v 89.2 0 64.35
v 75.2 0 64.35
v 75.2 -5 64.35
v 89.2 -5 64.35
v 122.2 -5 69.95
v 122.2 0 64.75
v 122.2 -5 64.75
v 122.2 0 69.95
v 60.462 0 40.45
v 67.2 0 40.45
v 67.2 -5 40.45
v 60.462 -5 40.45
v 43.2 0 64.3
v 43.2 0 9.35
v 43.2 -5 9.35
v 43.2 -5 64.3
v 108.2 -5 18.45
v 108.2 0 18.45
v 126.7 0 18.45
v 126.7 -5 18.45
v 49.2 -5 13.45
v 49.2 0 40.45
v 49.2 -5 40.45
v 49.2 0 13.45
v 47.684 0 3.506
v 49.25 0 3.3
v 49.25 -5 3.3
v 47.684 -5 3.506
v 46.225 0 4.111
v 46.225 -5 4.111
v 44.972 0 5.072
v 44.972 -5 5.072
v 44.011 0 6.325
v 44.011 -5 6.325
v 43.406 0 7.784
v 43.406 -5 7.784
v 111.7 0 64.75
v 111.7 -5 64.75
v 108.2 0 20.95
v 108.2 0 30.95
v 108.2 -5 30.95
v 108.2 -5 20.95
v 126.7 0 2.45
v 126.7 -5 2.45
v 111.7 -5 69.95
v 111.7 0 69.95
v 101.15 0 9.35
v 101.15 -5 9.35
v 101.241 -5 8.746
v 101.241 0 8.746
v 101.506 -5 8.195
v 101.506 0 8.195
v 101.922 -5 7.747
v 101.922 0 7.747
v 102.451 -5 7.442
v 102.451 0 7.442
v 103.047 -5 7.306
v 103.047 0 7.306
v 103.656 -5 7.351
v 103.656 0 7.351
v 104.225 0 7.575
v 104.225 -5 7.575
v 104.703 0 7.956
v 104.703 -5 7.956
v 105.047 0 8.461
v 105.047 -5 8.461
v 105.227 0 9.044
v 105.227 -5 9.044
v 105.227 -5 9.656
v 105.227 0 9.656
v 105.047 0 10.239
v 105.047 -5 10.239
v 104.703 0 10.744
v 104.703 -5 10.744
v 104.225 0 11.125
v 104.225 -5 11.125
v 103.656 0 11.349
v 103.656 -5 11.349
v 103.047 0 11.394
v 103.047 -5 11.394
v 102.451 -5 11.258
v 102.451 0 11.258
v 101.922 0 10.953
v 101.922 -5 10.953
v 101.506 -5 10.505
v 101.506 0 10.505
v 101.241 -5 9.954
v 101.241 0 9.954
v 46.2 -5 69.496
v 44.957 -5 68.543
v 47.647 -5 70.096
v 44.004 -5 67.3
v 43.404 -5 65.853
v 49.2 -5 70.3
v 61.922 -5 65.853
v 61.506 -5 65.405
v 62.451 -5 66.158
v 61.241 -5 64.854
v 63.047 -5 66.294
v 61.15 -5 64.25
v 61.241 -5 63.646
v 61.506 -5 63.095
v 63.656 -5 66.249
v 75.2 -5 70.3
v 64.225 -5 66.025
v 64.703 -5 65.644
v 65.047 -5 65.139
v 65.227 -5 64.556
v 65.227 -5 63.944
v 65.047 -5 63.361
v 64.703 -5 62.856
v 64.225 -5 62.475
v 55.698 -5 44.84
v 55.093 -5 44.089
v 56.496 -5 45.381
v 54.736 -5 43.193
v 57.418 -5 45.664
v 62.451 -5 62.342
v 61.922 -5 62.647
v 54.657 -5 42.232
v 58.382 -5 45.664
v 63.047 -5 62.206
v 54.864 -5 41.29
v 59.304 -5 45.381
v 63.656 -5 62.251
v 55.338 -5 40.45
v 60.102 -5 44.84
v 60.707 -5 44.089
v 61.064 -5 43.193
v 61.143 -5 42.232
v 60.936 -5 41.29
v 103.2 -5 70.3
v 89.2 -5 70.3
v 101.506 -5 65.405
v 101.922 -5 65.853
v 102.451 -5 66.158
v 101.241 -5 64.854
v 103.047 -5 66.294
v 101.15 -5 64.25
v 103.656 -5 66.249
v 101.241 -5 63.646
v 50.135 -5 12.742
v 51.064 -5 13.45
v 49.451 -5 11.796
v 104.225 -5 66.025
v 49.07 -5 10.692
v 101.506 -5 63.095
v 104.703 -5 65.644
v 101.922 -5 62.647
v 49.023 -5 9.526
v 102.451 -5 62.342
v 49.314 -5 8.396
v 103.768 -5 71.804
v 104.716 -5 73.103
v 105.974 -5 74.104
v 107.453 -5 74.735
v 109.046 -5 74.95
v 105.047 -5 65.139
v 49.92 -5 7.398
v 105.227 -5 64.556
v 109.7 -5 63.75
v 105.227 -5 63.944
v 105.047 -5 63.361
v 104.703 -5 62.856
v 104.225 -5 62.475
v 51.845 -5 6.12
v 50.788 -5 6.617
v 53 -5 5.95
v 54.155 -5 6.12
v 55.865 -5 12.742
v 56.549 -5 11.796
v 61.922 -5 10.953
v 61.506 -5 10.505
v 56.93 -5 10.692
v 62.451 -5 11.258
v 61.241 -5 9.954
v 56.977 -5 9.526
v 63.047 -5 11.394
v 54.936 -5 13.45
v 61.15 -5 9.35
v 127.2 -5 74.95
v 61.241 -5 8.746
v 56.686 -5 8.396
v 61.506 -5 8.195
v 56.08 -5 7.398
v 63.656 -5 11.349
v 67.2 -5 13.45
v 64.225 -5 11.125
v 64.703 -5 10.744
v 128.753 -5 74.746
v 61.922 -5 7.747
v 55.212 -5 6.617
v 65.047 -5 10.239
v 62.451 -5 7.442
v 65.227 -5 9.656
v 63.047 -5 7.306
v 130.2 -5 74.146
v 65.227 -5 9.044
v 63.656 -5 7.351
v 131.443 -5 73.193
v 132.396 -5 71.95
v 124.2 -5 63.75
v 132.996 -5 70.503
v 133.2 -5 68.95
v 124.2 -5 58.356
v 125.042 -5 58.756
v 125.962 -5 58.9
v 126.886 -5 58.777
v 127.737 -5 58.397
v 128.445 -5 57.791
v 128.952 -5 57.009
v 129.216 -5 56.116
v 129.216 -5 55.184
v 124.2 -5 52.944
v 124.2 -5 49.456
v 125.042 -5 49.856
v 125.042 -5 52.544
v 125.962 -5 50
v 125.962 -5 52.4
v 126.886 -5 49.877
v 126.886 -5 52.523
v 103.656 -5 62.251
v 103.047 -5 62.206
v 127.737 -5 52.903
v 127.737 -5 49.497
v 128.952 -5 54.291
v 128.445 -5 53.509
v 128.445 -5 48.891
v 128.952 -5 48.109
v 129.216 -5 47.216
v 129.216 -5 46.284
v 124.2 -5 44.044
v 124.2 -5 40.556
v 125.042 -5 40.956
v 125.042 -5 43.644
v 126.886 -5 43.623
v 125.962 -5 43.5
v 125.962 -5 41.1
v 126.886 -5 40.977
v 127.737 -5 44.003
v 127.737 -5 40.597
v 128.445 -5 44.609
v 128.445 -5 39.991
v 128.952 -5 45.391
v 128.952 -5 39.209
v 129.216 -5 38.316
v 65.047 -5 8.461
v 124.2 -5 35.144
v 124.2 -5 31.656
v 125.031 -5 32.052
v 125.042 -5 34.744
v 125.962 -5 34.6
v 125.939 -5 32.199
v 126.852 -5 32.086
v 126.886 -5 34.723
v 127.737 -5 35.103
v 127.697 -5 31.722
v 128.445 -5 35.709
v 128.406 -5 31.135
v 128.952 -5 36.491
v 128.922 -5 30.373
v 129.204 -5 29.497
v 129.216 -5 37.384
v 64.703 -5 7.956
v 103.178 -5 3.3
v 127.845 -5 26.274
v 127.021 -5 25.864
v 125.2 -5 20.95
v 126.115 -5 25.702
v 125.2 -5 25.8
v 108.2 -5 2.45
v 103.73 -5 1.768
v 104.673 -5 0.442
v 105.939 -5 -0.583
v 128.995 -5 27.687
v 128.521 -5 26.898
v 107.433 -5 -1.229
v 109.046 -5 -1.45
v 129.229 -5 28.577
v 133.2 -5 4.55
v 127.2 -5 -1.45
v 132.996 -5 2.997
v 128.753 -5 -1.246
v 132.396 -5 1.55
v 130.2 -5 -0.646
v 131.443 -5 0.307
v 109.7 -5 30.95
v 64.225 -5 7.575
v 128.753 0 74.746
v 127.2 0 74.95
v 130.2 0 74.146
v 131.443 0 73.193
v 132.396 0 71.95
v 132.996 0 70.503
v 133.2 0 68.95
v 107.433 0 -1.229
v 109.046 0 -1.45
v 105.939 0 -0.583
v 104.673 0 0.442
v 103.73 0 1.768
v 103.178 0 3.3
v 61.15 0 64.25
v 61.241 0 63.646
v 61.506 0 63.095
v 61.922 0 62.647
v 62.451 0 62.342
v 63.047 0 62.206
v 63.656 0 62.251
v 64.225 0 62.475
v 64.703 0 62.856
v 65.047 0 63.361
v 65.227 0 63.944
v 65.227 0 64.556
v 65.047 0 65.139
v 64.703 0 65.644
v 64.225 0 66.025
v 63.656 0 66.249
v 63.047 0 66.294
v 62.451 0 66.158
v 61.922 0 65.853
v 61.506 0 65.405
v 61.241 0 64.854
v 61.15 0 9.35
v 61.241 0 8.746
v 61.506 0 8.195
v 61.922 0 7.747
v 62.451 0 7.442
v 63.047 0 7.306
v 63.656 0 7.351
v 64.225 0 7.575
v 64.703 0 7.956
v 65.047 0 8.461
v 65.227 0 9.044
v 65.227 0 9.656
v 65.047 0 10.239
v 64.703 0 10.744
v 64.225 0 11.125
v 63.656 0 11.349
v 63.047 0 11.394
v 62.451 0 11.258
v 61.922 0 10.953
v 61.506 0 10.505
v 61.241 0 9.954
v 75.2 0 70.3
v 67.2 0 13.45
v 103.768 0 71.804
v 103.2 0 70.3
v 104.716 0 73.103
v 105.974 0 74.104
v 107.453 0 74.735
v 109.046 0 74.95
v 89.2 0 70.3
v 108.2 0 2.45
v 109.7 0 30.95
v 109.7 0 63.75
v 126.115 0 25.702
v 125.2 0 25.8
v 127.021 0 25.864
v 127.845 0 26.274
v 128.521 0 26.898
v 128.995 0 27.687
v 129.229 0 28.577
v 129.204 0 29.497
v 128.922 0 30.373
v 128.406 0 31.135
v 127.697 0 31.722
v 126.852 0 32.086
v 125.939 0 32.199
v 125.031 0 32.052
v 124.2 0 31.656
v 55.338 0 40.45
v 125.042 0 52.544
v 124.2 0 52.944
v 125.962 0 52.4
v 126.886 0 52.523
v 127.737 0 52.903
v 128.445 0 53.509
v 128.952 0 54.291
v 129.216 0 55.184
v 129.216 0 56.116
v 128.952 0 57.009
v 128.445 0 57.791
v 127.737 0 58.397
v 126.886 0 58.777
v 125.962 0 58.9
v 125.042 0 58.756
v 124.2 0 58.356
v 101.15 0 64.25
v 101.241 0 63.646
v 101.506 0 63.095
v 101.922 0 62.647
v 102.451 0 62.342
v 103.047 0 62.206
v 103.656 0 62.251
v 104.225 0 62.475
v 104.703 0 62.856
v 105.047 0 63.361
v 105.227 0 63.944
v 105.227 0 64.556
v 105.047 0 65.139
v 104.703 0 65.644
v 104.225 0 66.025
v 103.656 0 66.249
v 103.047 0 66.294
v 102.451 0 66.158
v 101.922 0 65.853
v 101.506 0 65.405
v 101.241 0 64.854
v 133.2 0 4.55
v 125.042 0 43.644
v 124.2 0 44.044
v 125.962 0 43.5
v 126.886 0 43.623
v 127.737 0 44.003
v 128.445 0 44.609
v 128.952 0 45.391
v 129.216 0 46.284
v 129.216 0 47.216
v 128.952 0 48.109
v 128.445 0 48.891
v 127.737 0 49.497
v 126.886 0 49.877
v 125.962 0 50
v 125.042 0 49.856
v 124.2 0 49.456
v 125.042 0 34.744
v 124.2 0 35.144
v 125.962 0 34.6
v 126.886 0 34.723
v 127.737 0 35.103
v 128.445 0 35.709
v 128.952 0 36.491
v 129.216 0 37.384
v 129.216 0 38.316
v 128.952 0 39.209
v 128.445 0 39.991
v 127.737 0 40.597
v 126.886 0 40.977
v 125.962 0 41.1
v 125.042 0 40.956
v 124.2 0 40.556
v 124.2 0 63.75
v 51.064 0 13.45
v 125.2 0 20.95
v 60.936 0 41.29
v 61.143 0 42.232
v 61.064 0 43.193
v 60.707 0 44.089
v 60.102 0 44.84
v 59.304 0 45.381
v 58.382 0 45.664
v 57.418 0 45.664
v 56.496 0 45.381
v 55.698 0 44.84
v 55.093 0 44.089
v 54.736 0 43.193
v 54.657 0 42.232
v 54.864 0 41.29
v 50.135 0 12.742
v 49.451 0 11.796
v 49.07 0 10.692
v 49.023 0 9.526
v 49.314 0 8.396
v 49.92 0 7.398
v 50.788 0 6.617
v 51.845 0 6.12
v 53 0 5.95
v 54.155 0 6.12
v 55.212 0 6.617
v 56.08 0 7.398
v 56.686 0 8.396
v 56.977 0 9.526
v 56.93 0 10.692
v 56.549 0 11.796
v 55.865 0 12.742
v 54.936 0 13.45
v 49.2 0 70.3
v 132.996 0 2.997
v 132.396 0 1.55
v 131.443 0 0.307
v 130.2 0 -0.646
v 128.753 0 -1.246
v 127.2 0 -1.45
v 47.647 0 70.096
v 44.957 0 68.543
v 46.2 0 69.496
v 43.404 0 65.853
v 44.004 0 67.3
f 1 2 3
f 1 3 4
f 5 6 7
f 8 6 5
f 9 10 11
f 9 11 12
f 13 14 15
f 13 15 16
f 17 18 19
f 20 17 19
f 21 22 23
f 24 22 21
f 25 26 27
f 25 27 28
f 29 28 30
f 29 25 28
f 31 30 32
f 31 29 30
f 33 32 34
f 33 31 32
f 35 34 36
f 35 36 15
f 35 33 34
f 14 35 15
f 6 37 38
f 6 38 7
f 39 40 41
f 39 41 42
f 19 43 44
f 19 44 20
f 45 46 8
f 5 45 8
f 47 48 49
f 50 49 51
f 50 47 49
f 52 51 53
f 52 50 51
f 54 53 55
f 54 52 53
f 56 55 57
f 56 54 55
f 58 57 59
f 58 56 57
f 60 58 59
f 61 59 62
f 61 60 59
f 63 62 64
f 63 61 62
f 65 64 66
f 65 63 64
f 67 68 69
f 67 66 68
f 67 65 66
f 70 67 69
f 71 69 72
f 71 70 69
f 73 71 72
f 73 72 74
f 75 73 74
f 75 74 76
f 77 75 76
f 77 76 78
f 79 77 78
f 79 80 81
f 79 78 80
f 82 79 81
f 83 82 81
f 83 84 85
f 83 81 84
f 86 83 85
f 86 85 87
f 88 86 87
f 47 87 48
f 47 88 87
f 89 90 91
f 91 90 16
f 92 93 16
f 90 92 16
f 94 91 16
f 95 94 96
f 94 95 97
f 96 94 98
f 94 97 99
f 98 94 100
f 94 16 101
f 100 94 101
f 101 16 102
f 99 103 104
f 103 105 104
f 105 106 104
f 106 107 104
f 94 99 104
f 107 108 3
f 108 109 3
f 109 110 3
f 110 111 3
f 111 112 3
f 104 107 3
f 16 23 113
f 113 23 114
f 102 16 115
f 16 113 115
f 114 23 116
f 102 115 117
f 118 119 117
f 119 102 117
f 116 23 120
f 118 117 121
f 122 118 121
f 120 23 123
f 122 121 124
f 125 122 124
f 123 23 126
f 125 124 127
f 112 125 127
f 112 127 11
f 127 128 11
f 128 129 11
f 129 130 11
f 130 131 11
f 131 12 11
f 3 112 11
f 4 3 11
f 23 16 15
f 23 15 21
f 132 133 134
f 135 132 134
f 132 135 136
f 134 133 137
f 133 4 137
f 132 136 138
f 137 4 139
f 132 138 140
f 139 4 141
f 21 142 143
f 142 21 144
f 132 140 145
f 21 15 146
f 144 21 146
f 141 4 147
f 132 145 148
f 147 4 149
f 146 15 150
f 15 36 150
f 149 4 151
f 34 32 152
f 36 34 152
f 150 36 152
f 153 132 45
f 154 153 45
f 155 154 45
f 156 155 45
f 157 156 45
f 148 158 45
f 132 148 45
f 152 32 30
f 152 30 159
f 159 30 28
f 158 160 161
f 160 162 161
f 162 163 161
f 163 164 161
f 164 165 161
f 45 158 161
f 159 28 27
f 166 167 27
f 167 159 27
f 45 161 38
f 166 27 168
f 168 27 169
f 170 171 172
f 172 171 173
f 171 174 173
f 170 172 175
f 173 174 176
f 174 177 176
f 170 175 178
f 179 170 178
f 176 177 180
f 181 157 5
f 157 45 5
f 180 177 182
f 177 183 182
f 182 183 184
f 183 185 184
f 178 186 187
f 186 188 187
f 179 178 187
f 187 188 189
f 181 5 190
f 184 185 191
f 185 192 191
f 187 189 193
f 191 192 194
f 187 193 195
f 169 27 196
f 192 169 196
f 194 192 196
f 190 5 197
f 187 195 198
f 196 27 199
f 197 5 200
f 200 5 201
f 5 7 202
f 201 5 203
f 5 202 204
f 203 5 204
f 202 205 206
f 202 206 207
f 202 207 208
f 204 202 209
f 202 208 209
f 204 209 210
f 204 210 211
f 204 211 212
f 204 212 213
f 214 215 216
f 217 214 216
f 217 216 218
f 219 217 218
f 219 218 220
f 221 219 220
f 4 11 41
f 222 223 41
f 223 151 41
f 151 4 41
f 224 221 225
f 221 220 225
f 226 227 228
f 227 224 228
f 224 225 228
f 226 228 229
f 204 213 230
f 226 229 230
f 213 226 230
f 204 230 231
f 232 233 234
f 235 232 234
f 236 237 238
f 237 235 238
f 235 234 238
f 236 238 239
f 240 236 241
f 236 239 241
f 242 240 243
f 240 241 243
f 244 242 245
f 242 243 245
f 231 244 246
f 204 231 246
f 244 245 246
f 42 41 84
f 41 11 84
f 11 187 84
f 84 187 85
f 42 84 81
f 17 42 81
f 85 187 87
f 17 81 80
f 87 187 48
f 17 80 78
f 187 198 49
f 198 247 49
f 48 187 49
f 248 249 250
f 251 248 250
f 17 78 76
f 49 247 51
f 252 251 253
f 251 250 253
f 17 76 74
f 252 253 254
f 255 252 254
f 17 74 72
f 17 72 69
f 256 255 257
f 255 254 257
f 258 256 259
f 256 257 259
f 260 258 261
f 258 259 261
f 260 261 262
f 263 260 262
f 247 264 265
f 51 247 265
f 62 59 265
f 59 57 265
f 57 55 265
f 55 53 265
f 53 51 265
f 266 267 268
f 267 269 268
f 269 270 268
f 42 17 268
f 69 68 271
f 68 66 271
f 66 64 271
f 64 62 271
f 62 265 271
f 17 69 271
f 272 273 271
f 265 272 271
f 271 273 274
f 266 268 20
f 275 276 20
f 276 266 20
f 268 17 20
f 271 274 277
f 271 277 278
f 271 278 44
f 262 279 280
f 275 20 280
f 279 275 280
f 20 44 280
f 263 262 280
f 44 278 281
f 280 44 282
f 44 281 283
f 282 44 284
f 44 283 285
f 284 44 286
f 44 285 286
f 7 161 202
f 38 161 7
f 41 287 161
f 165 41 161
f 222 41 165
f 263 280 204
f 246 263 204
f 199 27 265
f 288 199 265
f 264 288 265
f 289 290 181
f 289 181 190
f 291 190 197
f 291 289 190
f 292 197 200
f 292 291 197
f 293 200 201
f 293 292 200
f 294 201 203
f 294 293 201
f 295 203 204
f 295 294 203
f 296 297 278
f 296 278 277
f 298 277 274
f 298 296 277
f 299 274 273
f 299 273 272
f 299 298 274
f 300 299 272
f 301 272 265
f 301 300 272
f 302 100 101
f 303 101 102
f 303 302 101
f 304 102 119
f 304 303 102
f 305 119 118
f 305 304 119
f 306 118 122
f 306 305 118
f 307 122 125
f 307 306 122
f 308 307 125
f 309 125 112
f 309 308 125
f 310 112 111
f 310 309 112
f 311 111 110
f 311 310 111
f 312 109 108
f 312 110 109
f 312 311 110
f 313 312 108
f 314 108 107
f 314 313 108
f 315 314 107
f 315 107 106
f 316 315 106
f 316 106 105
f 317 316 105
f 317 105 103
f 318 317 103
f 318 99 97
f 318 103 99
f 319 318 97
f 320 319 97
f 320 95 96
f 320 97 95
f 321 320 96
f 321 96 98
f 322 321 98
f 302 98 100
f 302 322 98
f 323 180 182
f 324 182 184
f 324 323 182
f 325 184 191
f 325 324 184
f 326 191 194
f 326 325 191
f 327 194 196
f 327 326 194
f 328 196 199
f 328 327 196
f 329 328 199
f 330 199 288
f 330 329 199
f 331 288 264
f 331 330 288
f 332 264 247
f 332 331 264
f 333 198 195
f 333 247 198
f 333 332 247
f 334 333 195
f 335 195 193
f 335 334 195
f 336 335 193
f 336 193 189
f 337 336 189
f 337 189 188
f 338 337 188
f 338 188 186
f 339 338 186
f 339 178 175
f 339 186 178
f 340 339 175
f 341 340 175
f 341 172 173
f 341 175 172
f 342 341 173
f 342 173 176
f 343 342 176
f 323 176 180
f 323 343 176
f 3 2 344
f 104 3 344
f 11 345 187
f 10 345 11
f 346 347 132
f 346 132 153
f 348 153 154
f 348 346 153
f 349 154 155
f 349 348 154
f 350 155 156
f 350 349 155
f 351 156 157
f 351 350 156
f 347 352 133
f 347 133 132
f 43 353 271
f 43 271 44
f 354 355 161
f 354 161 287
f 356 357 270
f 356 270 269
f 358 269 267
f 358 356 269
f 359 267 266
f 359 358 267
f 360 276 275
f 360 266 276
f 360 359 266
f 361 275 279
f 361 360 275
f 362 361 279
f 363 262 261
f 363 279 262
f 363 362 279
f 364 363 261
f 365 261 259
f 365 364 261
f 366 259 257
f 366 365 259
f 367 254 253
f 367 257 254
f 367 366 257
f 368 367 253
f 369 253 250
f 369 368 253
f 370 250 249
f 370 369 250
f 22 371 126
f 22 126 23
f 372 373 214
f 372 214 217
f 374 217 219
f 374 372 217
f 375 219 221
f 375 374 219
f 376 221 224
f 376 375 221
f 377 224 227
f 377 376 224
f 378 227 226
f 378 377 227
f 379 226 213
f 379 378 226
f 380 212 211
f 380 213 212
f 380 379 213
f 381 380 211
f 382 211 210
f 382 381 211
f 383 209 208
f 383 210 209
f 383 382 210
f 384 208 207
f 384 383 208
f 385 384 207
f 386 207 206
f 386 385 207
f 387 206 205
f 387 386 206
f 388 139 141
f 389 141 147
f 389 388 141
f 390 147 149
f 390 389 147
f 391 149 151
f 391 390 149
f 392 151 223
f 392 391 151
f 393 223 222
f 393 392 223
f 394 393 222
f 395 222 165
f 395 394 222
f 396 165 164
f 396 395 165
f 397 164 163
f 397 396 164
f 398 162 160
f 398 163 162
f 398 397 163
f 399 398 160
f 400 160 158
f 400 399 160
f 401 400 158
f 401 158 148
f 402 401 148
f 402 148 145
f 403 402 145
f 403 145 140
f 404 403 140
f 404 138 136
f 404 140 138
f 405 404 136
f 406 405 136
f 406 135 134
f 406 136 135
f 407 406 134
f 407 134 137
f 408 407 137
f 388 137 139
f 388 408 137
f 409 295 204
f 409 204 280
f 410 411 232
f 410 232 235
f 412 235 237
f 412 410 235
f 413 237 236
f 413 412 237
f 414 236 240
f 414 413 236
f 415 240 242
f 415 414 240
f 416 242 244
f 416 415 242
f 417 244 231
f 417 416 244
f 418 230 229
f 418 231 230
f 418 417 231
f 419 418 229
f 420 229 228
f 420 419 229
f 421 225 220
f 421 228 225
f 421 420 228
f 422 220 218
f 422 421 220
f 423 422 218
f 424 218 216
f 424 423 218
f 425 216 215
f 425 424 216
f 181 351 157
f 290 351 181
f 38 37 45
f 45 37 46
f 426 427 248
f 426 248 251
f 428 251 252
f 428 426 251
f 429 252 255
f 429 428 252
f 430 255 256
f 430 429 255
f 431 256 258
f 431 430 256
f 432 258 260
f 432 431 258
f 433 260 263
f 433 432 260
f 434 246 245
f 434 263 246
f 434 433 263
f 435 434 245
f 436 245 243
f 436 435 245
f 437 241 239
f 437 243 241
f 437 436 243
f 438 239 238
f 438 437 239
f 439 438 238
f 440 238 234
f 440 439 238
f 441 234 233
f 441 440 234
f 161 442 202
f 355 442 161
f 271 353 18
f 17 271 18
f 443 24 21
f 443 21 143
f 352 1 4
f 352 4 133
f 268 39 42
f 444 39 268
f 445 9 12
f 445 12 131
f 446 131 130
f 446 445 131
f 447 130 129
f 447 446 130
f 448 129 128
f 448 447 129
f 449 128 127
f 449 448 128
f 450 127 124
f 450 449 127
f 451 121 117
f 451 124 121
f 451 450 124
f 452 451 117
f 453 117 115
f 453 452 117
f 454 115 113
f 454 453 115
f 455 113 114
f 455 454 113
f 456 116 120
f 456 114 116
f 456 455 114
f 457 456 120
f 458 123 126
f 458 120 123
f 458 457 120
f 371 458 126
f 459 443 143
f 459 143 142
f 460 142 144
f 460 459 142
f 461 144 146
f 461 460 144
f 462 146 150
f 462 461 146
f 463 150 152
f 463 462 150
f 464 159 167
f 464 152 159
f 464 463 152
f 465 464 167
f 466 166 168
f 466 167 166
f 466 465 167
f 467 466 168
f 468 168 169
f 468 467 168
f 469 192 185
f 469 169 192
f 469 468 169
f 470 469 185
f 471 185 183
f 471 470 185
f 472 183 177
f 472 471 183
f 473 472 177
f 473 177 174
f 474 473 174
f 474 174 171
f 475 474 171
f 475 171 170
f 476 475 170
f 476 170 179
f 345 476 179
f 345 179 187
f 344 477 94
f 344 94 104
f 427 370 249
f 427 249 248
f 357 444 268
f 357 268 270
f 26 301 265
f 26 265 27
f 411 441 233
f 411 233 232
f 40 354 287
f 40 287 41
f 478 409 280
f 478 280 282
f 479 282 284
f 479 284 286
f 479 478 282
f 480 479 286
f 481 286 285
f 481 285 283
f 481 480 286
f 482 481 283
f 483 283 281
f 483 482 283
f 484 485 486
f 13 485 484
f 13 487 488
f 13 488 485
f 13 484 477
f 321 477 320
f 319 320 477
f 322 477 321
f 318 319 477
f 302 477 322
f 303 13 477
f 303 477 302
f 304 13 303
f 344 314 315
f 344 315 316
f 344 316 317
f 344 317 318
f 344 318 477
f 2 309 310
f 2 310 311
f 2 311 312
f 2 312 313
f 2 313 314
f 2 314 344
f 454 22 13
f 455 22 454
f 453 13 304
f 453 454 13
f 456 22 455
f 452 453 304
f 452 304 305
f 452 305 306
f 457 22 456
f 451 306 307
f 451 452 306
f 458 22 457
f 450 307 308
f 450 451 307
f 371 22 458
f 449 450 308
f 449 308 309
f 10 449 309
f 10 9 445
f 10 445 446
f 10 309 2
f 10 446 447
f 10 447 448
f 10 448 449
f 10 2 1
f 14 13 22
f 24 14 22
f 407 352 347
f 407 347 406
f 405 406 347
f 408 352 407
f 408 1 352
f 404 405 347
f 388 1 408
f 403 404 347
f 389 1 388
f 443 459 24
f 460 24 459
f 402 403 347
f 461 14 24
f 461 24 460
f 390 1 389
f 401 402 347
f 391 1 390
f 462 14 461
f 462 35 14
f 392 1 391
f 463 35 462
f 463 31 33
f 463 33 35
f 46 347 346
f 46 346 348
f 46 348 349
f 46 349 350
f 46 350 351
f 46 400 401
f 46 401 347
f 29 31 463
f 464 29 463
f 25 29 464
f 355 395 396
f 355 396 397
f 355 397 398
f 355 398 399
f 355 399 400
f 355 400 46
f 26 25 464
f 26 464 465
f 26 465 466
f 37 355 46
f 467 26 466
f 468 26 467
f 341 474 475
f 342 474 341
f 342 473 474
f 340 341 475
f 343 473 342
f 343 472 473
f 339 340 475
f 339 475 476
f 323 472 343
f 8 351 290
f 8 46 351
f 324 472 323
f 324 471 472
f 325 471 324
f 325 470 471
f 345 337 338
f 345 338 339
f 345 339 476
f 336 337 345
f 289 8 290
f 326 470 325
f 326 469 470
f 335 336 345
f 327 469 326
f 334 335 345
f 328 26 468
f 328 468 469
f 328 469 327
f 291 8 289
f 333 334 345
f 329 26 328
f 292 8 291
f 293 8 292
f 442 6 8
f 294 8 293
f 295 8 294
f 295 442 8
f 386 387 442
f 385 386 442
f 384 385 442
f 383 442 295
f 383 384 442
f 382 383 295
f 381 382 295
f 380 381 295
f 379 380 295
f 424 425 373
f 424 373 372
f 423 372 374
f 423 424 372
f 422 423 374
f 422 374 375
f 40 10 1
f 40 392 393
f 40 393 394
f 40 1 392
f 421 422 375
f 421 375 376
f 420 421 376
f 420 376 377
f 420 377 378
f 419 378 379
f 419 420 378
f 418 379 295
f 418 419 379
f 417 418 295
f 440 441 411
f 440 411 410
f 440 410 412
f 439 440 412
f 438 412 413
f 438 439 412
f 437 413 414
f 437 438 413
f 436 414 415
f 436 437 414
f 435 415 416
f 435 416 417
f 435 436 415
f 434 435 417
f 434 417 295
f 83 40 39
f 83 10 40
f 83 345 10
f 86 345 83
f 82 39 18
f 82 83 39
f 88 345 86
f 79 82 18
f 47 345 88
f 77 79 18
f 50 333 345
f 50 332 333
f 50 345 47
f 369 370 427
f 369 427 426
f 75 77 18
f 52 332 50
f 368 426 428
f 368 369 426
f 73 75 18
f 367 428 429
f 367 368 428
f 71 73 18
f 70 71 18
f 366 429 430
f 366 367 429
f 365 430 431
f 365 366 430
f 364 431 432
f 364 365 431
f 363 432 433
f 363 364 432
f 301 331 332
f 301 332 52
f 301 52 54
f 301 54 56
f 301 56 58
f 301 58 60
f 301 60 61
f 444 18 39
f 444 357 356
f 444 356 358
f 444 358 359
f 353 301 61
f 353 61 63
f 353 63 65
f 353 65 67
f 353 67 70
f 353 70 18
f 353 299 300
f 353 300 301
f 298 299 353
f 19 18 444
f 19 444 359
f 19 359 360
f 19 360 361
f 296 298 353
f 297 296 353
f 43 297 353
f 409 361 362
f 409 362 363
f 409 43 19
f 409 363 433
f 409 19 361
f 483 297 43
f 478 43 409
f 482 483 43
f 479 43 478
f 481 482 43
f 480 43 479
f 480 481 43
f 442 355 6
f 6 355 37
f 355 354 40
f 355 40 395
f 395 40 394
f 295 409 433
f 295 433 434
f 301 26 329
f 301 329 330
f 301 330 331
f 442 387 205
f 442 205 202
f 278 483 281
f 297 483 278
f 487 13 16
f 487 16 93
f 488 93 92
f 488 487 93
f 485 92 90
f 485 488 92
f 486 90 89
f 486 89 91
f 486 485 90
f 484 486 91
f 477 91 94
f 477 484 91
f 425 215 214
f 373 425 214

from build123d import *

# Parameters (mm, degrees)
SKETCH_2_R          = 6.05
SKETCH_2_R_2        = 2.05
EXTRUDE_1_DEPTH     = 5
EXTRUDE_1_2_DEPTH   = 5
EXTRUDE_1_3_DEPTH   = 5
EXTRUDE_1_4_DEPTH   = 5
SKETCH_6_R          = 2.05
EXTRUDE_1_5_DEPTH   = 5
SKETCH_8_W          = 18.5
SKETCH_8_H          = 16
SKETCH_8_W_2        = 10.5
SKETCH_8_H_2        = 5.2
SKETCH_8_W_3        = 14
SKETCH_8_H_3        = 9
CUT_EXTRUDE_2_DEPTH = 153.920706577


with BuildPart() as part:
    # 草图2 → Extrude 1 (new body)
    with BuildSketch(Plane(origin=(0, 0, 0), x_dir=(-1, 0, 0), z_dir=(0, -1, 0))):
        with Locations((-103.2, -9.35)):
            Circle(SKETCH_2_R)
        with Locations((-103.2, -9.35)):
            Circle(SKETCH_2_R_2, mode=Mode.SUBTRACT)
    extrude(amount=EXTRUDE_1_DEPTH)



with BuildPart() as body_2:
    # 草图2 → Extrude 1 2 (new body)
    with BuildSketch(Plane(origin=(0, 0, 0), x_dir=(-1, 0, 0), z_dir=(0, -1, 0))):
        with Locations((-63.2, -9.35)):
            Circle(SKETCH_2_R)
        with Locations((-63.2, -9.35)):
            Circle(SKETCH_2_R_2, mode=Mode.SUBTRACT)
    extrude(amount=EXTRUDE_1_2_DEPTH)


with BuildPart() as body_3:
    # 草图2 → Extrude 1 3 (new body)
    with BuildSketch(Plane(origin=(0, 0, 0), x_dir=(-1, 0, 0), z_dir=(0, -1, 0))):
        with Locations((-63.2, -64.25)):
            Circle(SKETCH_2_R)
        with Locations((-63.2, -64.25)):
            Circle(SKETCH_2_R_2, mode=Mode.SUBTRACT)
    extrude(amount=EXTRUDE_1_3_DEPTH)


with BuildPart() as body_4:
    # 草图2 → Extrude 1 4 (new body)
    with BuildSketch(Plane(origin=(0, 0, 0), x_dir=(-1, 0, 0), z_dir=(0, -1, 0))):
        with Locations((-103.2, -64.25)):
            Circle(SKETCH_2_R)
        with Locations((-103.2, -64.25)):
            Circle(SKETCH_2_R_2, mode=Mode.SUBTRACT)
    extrude(amount=EXTRUDE_1_4_DEPTH)


with BuildPart() as part_1:
    add(part.part)

    add(body_2.part)  # Extrude 1 5 merges body 2

    add(body_3.part)  # Extrude 1 5 merges body 3

    add(body_4.part)  # Extrude 1 5 merges body 4
    # 草图6 → Extrude 1 5 (add)
    with BuildSketch(Plane(origin=(0, 0, 0), x_dir=(1, 0, 0), z_dir=(0, 1, 0))):
        with BuildLine():
            Line((127.2, 1.45), (109.046152581, 1.45))
            ThreePointArc((109.046152581, 1.45), (105.271235363, 0.113689527), (103.177805284, -3.3))
            Line((103.177805284, -3.3), (63.2, -3.3))
            Line((63.2, -3.3), (49.25, -3.3))
            ThreePointArc((49.25, -3.3), (44.972003974, -5.072003974), (43.2, -9.35))
            Line((43.2, -9.35), (43.2, -64.3))
            ThreePointArc((43.2, -64.3), (44.957359313, -68.542640687), (49.2, -70.3))
            Line((49.2, -70.3), (103.2, -70.3))
            ThreePointArc((103.2, -70.3), (105.311182702, -73.645742753), (109.046152581, -74.95))
            Line((109.046152581, -74.95), (127.2, -74.95))
            ThreePointArc((127.2, -74.95), (131.442640687, -73.192640687), (133.2, -68.95))
            Line((133.2, -68.95), (133.2, -4.55))
            ThreePointArc((133.2, -4.55), (131.442640687, -0.307359313), (127.2, 1.45))
        make_face()
        with Locations(Location((103.2, -9.35, 0), (0, 0, 270))):
            Circle(SKETCH_6_R, mode=Mode.SUBTRACT)
        with Locations(Location((103.2, -64.25, 0), (0, 0, 270))):
            Circle(SKETCH_6_R, mode=Mode.SUBTRACT)
        with Locations(Location((63.2, -64.25, 0), (0, 0, 270))):
            Circle(SKETCH_6_R, mode=Mode.SUBTRACT)
        with Locations(Location((63.2, -9.35, 0), (0, 0, 90))):
            Circle(SKETCH_6_R, mode=Mode.SUBTRACT)
    extrude(amount=-EXTRUDE_1_5_DEPTH)

    # 草图8 → 切除-拉伸2 (cut, through all)
    with BuildSketch(Plane.XZ):
        with BuildLine():
            Line((67.2, 13.45), (67.2, 40.45))
            Line((67.2, 40.45), (60.461737691, 40.45))
            ThreePointArc((60.461737691, 40.45), (57.9, 45.7), (55.338262309, 40.45))
            Line((55.338262309, 40.45), (49.2, 40.45))
            Line((49.2, 40.45), (49.2, 13.45))
            Line((49.2, 13.45), (51.063508327, 13.45))
            ThreePointArc((51.063508327, 13.45), (53, 5.95), (54.936491673, 13.45))
            Line((54.936491673, 13.45), (67.2, 13.45))
        make_face()
        with Locations((117.45, 10.45)):
            Rectangle(SKETCH_8_W, SKETCH_8_H)
        with BuildLine():
            Line((108.2, 20.95), (125.2, 20.95))
            Line((125.2, 20.95), (125.2, 25.8))
            ThreePointArc((125.2, 25.8), (129.203625856, 29.497066152), (124.2, 31.656011826))
            Line((124.2, 31.656011826), (124.2, 35.143988174))
            ThreePointArc((124.2, 35.143988174), (129.25, 37.85), (124.2, 40.556011826))
            Line((124.2, 40.556011826), (124.2, 44.043988174))
            ThreePointArc((124.2, 44.043988174), (129.25, 46.75), (124.2, 49.456011826))
            Line((124.2, 49.456011826), (124.2, 52.943988174))
            ThreePointArc((124.2, 52.943988174), (129.25, 55.65), (124.2, 58.356011826))
            Line((124.2, 58.356011826), (124.2, 63.75))
            Line((124.2, 63.75), (122.2, 63.75))
            Line((122.2, 63.75), (111.7, 63.75))
            Line((111.7, 63.75), (109.7, 63.75))
            Line((109.7, 63.75), (109.7, 30.95))
            Line((109.7, 30.95), (108.2, 30.95))
            Line((108.2, 30.95), (108.2, 20.95))
        make_face()
        with Locations((116.95, 67.35)):
            Rectangle(SKETCH_8_W_2, SKETCH_8_H_2)
        with Locations((82.2, 68.85)):
            Rectangle(SKETCH_8_W_3, SKETCH_8_H_3)
    extrude(amount=CUT_EXTRUDE_2_DEPTH, mode=Mode.SUBTRACT)


solid = part_1.part
